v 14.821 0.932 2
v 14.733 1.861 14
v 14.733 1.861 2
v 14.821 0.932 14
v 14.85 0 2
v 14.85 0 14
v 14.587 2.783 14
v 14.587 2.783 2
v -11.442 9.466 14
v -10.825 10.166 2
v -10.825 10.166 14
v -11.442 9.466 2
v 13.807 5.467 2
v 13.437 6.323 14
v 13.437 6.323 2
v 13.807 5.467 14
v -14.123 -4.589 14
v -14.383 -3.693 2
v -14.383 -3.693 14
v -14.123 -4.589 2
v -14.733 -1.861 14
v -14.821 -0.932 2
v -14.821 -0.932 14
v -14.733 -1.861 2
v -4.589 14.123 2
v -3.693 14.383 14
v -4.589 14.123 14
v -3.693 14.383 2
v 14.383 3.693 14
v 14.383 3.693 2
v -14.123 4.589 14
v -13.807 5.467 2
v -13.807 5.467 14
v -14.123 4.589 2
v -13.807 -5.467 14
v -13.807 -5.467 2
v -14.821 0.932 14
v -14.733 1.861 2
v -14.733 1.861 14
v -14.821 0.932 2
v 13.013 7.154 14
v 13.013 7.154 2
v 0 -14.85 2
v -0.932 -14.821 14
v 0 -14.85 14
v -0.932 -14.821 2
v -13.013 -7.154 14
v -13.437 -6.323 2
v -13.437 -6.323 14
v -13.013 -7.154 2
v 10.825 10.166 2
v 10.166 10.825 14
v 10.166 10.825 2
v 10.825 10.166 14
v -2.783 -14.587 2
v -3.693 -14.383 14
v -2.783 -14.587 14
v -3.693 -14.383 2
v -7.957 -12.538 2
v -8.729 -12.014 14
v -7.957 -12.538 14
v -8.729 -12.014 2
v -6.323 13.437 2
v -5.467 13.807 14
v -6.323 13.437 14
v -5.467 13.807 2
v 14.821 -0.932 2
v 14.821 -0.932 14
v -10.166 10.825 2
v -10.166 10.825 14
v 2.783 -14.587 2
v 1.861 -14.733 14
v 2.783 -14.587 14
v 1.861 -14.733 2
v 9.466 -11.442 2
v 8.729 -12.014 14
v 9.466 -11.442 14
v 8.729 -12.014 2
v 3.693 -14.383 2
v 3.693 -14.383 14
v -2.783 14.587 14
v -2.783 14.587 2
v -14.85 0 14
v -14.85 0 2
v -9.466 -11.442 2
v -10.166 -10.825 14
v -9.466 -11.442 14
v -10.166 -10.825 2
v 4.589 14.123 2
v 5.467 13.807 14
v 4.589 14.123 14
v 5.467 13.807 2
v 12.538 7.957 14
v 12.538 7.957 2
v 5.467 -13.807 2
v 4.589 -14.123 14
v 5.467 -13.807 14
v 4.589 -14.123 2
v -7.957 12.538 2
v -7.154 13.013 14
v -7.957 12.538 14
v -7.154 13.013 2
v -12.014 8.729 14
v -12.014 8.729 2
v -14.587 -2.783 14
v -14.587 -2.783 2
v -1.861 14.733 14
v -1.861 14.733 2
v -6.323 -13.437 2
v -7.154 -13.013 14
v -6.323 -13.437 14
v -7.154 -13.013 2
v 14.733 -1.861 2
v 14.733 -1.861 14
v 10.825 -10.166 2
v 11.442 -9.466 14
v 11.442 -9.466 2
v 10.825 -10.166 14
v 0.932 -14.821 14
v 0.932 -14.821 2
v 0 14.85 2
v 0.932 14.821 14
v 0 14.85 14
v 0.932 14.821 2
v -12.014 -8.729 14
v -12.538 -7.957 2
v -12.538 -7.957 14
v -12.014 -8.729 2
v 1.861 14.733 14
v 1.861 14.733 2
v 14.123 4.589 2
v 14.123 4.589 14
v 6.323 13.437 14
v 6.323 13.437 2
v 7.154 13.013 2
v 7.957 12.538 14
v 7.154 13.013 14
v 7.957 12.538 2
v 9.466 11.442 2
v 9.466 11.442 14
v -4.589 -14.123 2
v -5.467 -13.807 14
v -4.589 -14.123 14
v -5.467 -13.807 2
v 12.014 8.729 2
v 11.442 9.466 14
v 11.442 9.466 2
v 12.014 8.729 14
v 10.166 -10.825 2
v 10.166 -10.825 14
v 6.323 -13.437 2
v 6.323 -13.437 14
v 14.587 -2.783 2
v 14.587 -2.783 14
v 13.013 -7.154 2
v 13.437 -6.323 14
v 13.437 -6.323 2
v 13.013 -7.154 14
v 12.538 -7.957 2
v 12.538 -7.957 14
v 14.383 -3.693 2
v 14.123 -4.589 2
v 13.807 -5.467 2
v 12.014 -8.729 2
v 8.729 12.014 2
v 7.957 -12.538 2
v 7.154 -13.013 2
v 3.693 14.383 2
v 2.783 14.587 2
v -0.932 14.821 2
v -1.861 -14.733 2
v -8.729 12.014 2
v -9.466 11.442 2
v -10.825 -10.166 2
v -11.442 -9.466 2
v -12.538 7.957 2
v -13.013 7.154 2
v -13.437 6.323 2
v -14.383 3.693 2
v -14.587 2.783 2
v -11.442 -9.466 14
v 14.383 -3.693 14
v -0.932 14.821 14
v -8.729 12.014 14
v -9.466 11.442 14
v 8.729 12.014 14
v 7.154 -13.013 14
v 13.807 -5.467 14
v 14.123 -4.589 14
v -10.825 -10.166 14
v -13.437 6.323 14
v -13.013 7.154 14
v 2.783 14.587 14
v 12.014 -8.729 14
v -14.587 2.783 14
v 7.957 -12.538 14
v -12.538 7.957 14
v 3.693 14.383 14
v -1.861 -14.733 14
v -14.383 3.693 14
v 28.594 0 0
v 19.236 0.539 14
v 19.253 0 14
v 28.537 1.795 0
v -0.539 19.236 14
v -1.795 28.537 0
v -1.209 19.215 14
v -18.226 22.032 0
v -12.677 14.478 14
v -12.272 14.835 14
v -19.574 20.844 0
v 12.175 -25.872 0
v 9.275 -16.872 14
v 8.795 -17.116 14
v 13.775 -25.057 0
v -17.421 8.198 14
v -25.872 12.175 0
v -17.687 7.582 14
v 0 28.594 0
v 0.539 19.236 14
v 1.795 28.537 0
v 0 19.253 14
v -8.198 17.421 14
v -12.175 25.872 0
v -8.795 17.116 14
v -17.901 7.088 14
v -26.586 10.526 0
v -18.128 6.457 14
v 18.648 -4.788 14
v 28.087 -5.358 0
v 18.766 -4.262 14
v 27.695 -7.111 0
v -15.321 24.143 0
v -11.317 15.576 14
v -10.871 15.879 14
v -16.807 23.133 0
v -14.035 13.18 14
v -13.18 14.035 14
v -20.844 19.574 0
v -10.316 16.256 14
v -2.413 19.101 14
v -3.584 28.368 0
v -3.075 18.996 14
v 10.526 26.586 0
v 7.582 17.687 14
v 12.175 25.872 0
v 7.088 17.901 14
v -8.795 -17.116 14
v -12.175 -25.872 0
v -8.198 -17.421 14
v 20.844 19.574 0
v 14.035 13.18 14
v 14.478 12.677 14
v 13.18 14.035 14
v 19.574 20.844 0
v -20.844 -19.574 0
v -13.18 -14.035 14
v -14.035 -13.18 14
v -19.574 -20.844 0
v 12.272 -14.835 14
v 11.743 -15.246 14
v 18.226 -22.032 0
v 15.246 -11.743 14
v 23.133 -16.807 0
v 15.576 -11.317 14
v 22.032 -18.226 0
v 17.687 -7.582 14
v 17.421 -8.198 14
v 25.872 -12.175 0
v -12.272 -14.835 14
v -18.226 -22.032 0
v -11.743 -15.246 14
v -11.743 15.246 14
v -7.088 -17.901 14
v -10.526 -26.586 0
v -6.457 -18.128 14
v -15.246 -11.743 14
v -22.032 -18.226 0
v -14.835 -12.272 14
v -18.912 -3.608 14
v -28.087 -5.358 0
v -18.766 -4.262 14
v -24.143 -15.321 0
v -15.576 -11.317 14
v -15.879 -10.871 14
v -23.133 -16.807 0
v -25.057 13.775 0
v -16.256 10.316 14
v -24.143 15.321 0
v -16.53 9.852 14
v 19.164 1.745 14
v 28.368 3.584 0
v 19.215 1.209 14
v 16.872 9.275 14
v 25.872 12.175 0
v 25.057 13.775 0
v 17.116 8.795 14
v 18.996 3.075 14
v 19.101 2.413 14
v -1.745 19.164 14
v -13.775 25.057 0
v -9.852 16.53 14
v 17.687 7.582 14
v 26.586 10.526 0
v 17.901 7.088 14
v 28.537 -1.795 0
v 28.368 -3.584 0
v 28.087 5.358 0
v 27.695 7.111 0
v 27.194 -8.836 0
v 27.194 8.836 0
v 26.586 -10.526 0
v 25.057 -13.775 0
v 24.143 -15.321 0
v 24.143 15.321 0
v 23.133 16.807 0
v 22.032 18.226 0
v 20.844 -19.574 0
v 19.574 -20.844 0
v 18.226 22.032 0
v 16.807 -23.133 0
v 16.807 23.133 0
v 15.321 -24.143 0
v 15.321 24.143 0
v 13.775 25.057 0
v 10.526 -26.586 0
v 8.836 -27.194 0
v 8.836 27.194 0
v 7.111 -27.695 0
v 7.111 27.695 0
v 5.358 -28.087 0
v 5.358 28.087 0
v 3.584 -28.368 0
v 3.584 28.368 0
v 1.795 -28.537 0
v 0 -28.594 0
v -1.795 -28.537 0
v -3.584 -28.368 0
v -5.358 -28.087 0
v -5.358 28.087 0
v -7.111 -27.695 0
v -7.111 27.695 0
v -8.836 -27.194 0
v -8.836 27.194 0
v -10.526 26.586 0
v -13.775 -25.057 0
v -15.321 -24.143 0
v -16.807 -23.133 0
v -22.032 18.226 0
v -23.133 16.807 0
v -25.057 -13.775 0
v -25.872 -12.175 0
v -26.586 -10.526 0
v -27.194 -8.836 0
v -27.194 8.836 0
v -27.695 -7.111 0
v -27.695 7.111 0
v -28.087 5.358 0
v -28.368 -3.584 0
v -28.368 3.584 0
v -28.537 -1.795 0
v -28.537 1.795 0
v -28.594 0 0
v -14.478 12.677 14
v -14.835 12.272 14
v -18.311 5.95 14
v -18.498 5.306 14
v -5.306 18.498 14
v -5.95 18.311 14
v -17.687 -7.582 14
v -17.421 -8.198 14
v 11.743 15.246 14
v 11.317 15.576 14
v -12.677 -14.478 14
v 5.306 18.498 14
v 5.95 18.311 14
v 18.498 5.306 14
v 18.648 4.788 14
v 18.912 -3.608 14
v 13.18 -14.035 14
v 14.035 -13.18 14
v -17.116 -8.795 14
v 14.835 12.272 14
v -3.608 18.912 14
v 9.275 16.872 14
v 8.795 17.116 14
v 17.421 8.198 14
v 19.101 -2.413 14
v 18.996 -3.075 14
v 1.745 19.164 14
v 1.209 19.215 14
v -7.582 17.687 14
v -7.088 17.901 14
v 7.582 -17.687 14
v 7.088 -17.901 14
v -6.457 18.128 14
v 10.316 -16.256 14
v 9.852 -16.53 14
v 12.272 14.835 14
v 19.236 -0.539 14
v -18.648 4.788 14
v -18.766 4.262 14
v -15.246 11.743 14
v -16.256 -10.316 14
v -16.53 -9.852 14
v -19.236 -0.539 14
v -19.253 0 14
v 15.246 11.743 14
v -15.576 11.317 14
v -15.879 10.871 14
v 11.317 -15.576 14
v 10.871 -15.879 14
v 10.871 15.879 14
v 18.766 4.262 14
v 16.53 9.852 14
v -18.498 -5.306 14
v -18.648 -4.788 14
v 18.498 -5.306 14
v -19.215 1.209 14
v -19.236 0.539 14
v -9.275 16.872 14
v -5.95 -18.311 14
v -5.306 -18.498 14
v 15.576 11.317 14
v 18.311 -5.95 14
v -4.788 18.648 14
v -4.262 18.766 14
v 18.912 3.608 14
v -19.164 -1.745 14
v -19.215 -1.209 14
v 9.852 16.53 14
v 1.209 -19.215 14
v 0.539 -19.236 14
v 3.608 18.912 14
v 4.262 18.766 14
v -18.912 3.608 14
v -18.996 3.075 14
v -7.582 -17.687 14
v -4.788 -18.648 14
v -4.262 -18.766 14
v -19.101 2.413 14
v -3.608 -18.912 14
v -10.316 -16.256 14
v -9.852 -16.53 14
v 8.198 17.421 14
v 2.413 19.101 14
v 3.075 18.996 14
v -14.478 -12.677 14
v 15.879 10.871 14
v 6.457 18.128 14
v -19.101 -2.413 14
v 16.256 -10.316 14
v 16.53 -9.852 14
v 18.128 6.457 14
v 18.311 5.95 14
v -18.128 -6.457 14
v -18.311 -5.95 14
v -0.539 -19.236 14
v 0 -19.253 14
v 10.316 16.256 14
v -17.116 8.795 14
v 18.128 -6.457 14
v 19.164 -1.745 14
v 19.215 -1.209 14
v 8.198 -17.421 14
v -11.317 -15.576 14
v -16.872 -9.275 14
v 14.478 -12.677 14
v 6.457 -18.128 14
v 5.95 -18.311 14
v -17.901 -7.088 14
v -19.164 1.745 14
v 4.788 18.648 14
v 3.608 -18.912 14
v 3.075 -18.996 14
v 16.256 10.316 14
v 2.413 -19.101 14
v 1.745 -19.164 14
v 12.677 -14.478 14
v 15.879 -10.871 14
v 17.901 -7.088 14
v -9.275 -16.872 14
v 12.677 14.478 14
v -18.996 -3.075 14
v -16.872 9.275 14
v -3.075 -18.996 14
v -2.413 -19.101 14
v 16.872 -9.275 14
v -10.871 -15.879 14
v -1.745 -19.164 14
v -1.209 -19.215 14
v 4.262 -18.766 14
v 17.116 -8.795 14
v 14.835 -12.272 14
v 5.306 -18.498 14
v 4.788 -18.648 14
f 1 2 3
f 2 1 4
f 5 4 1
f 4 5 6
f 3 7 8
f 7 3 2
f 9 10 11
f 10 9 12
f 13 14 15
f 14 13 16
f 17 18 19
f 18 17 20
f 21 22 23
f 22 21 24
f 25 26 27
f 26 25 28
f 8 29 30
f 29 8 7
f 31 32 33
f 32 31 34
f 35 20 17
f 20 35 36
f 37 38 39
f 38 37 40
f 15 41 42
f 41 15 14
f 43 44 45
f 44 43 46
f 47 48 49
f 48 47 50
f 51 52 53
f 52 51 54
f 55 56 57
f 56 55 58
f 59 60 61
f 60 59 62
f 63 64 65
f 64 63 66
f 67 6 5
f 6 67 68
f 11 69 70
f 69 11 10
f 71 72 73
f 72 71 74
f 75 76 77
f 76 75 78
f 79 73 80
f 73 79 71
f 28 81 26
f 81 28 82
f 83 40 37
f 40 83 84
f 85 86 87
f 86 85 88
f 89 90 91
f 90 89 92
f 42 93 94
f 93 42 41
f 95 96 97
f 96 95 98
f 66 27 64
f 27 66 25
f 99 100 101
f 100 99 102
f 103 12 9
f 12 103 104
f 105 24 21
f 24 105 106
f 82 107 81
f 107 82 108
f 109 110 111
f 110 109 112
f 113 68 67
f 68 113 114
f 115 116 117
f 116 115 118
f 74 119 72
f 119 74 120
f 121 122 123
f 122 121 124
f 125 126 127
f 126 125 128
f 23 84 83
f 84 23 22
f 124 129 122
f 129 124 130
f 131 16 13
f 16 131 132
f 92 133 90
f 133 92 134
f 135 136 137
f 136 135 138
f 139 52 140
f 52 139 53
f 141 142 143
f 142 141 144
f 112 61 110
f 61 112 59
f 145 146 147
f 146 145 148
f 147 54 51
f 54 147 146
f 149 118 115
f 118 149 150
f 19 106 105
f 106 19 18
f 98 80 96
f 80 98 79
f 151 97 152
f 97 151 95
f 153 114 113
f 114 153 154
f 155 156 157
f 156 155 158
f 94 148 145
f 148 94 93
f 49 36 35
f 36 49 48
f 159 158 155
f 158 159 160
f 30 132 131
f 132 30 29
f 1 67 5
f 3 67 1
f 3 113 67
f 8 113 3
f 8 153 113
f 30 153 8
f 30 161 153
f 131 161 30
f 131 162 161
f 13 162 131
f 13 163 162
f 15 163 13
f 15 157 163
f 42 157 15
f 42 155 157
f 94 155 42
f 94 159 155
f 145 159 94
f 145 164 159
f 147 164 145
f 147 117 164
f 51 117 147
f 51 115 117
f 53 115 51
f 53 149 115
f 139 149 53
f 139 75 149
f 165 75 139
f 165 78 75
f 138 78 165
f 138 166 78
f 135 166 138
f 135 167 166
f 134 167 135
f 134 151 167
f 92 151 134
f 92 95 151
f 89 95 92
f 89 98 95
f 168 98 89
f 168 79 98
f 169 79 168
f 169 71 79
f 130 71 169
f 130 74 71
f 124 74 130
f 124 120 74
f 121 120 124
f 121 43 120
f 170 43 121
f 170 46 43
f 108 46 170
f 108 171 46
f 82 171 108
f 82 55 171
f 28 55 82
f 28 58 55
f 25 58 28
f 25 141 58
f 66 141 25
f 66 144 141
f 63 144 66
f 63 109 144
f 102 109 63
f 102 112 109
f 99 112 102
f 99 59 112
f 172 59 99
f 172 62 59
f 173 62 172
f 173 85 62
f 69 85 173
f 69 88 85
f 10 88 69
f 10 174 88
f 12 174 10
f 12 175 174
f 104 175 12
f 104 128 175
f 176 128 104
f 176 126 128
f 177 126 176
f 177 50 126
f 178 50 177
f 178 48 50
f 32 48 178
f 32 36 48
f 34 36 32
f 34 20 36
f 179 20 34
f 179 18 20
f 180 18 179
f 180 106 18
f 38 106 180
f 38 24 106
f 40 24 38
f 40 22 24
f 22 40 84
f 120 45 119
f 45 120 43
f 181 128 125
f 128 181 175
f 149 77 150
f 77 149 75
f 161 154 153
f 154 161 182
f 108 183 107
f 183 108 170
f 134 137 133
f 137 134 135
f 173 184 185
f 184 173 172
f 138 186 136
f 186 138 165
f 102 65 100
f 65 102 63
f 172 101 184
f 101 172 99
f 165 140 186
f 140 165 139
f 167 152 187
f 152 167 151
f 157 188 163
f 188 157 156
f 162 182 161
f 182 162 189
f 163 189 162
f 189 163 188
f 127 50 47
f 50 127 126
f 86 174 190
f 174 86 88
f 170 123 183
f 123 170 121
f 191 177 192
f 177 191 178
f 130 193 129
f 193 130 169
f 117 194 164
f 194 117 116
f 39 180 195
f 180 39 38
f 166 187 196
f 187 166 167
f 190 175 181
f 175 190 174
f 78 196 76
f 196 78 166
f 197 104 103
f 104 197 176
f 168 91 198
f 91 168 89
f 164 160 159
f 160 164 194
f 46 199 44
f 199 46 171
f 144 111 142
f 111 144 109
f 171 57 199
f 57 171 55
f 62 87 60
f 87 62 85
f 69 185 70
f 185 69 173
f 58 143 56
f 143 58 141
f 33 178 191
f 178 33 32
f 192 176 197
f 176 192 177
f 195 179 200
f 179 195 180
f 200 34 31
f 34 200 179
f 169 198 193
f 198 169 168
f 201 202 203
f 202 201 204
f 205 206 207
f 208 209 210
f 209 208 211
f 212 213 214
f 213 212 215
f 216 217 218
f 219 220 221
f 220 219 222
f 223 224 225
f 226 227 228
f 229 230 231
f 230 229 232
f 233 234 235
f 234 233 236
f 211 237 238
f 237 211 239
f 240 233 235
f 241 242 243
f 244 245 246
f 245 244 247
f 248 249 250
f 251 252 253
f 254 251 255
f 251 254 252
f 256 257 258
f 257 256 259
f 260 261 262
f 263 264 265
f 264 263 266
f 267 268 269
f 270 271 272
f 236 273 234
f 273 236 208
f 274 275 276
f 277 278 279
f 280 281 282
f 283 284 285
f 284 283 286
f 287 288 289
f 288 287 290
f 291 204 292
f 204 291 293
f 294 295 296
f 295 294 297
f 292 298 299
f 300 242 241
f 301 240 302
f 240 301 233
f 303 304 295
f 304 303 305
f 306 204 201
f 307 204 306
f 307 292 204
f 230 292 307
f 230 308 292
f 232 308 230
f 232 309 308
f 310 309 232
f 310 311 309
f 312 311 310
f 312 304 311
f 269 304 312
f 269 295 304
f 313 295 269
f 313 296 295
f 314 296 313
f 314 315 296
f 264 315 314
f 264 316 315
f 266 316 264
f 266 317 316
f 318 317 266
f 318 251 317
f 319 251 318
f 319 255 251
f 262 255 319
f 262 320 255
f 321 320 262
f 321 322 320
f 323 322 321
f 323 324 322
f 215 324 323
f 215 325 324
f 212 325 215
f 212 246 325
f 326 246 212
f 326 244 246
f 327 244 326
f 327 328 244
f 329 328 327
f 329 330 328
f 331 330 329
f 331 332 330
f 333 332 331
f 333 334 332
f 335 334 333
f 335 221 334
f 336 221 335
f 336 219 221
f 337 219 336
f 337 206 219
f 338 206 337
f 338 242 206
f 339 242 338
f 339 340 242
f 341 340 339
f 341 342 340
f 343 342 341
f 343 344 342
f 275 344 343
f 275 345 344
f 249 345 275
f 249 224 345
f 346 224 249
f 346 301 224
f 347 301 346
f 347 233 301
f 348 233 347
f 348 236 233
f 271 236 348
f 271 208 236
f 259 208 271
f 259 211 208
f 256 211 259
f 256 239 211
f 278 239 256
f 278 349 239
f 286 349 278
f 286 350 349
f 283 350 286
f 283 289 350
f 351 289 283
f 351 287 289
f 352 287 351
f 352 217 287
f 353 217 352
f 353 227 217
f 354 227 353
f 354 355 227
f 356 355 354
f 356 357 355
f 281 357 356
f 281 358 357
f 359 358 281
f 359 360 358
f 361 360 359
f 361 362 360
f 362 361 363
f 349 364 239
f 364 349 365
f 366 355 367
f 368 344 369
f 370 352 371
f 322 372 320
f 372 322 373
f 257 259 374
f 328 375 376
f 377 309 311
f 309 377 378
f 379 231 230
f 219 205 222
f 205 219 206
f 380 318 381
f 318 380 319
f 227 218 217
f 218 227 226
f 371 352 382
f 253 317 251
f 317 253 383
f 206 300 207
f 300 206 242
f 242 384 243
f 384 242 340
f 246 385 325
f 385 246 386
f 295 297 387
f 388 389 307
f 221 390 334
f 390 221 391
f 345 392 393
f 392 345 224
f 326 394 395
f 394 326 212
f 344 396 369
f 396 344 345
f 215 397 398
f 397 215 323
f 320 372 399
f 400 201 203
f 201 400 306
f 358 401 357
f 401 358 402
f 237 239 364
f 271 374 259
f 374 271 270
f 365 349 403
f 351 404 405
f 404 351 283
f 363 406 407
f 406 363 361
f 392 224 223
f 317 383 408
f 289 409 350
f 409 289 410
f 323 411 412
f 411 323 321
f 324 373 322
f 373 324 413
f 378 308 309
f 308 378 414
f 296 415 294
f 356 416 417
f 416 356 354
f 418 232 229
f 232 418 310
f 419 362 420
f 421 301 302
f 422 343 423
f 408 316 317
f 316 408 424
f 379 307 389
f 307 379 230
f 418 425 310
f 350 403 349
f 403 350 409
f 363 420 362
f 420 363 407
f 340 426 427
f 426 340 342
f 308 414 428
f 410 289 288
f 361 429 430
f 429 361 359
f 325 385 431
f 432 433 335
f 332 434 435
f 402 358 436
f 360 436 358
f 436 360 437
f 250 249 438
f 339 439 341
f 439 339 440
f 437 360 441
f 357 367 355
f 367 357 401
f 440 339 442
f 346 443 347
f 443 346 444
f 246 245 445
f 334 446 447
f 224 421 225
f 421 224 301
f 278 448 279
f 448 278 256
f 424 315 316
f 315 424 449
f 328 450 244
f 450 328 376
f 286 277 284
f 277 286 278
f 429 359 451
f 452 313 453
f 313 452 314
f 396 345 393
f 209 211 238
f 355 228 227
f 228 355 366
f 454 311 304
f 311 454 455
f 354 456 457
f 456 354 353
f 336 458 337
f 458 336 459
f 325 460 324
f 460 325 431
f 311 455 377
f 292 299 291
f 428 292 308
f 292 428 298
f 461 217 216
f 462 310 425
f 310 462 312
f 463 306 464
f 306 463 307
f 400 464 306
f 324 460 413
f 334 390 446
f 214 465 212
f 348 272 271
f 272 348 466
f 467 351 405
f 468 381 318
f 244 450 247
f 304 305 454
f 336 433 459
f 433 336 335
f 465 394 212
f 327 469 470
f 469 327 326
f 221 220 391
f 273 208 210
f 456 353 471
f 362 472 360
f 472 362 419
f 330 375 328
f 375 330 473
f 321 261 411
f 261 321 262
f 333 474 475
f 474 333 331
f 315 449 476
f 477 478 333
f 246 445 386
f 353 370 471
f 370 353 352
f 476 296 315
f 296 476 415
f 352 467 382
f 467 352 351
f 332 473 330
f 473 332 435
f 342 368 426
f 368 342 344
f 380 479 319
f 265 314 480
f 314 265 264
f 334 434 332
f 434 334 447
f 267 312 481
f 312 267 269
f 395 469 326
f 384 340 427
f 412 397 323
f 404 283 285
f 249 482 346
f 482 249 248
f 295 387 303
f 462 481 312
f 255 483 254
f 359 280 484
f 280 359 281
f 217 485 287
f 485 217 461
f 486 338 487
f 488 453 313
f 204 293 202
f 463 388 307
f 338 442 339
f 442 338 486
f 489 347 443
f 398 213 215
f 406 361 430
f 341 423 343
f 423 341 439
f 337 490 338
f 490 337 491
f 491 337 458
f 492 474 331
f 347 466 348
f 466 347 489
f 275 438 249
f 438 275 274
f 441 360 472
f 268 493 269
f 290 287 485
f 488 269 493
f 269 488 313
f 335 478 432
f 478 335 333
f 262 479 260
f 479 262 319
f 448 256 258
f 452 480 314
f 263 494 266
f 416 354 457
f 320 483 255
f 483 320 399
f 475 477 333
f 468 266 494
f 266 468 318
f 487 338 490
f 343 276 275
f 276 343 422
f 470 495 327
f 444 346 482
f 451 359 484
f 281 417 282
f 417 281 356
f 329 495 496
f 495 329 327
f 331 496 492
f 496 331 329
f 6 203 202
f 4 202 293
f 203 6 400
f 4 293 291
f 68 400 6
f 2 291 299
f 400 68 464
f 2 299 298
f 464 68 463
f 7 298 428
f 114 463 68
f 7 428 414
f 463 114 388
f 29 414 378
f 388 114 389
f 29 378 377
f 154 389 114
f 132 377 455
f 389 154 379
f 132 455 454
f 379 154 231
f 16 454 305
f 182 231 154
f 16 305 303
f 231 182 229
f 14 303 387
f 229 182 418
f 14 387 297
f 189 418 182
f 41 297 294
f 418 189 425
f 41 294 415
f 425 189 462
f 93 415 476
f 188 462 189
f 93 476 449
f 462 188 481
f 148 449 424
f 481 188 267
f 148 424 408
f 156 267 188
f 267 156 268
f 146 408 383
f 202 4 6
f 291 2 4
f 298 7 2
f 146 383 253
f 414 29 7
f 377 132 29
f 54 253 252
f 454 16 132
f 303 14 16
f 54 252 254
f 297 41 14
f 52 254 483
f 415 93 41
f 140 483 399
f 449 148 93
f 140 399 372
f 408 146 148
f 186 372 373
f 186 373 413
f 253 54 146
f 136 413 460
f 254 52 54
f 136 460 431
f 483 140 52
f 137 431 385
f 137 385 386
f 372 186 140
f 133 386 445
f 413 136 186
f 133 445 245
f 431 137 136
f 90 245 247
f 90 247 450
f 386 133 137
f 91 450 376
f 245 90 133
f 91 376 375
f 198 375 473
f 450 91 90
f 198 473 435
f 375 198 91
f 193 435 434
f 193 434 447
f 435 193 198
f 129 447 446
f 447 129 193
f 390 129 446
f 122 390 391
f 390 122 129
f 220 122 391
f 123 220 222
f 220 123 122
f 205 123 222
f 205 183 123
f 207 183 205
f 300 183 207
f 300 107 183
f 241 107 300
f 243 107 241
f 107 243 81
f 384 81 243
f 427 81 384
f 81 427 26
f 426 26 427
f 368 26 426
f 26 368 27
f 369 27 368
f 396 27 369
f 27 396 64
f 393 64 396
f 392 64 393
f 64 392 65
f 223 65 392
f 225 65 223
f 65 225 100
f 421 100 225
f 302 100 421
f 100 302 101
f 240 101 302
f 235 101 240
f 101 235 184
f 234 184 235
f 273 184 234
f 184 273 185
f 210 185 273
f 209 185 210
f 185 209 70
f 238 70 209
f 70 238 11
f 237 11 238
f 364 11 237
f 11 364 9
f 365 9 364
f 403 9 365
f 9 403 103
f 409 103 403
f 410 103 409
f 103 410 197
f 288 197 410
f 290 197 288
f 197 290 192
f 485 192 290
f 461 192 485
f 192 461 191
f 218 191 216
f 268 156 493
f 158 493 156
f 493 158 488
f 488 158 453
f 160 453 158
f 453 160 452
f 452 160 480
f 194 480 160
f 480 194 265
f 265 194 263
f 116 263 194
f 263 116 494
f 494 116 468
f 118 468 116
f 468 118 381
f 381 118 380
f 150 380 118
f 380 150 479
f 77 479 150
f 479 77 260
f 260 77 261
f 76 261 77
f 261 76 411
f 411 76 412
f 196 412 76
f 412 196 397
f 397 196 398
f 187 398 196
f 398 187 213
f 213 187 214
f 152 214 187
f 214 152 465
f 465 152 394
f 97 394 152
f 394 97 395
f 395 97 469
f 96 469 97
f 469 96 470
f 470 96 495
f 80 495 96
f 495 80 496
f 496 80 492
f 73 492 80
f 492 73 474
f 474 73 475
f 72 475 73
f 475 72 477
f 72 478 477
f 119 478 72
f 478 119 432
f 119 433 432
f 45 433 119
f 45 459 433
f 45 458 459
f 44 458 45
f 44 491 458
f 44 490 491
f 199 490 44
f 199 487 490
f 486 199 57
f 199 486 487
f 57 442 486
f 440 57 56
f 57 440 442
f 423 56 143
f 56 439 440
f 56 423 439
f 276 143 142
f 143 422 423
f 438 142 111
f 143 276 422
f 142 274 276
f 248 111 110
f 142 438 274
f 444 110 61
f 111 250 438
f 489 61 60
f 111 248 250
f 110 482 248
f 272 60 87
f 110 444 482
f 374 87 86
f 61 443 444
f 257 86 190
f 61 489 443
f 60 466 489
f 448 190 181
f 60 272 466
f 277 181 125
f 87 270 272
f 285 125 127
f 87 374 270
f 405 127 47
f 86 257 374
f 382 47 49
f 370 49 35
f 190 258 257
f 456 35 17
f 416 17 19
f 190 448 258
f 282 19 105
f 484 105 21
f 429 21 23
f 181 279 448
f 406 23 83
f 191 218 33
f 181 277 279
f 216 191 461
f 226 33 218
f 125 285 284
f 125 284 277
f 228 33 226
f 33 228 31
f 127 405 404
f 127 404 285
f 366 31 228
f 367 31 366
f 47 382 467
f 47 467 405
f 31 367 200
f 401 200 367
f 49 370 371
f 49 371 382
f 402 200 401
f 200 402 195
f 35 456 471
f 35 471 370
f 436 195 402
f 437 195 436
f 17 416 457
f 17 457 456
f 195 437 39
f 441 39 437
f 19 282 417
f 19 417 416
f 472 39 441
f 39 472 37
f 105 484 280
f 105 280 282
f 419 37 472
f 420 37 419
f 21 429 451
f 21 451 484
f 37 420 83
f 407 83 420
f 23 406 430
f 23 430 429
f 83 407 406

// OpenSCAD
//returns the distance from center to create a small circle of radius scr
//scr - small circle radius
//r - sphere radius
function small_circle(scr, r) = sqrt(pow(r,2)-pow(scr,2));

min_wall_thickness=1;

bearing_od = 22;
bearing_id = 8;
light_od = 9;
light_height = 8;
light_base = 29.5;

moon_d = 76.25;
moon_support_od = moon_d+min_wall_thickness;

base_od = moon_d*3/4;
base_height = 17;

layer_thickness=.2;
bottom_thickness=10*layer_thickness;

tolerance=.2;

moon_offset = small_circle(light_od/2, moon_d/2);
echo(moon_offset=moon_offset);

moon_cup_h = 5;
top_bottom_overlap=5;

$fn=100;

show_top=false;
show_bottom=true;
show_light=false;

if(show_light) {
    translate([0,0,bottom_thickness])
        color("Gold", .75)
            build_light(.4);
}

if(show_top) {
    color("gray")
        build_top_interface();
}

if(show_bottom) {
    color("lightblue")
        build_bottom_base();
}

module build_bottom() {
    difference() {
        cylinder(h=base_height+bottom_thickness+min_wall_thickness, r1=base_od/2, r2=(light_base+min_wall_thickness)/2);

        translate([0,0,bottom_thickness])
            build_light(.2);
    }
}

module build_bottom_base() {
    difference() {
        build_bottom();

        translate([0,0,base_height+bottom_thickness-top_bottom_overlap])
            linear_extrude(10)
                circle(d=light_base+10);
    }
}

module build_top_interface() {
    height = base_height+bottom_thickness+min_wall_thickness;
    difference() {
        group() {
            difference() {
                cylinder(h=height, r1=base_od/2, r2=(light_base+min_wall_thickness)/2);

                translate([0,0,-1])
                    linear_extrude(base_height+bottom_thickness-top_bottom_overlap + 1)
                    circle(d=base_od);

            }

            translate([0,0,height+moon_offset])
                difference() {
                    sphere(d=moon_support_od);
                    sphere(d=moon_d);

                    translate([0,0,moon_cup_h])
                        cube([moon_d+2,moon_d+2,moon_d+2],center=true);
                }
        }

        translate([0,0,bottom_thickness])
            build_light(.4);
    }
}

module build_light(tolerance=0) {
    height = base_height+tolerance;
    base_od = light_base+tolerance;
    light_d = light_od+tolerance;
    light_h = light_height+tolerance;
    cylinder(h=height, r=base_od/2);
    translate([0,0,height])
        cylinder(h=light_h-light_d/2, r=light_d/2);
    translate([0,0,height+light_h-light_d/2])
        sphere(d=light_d);
}
